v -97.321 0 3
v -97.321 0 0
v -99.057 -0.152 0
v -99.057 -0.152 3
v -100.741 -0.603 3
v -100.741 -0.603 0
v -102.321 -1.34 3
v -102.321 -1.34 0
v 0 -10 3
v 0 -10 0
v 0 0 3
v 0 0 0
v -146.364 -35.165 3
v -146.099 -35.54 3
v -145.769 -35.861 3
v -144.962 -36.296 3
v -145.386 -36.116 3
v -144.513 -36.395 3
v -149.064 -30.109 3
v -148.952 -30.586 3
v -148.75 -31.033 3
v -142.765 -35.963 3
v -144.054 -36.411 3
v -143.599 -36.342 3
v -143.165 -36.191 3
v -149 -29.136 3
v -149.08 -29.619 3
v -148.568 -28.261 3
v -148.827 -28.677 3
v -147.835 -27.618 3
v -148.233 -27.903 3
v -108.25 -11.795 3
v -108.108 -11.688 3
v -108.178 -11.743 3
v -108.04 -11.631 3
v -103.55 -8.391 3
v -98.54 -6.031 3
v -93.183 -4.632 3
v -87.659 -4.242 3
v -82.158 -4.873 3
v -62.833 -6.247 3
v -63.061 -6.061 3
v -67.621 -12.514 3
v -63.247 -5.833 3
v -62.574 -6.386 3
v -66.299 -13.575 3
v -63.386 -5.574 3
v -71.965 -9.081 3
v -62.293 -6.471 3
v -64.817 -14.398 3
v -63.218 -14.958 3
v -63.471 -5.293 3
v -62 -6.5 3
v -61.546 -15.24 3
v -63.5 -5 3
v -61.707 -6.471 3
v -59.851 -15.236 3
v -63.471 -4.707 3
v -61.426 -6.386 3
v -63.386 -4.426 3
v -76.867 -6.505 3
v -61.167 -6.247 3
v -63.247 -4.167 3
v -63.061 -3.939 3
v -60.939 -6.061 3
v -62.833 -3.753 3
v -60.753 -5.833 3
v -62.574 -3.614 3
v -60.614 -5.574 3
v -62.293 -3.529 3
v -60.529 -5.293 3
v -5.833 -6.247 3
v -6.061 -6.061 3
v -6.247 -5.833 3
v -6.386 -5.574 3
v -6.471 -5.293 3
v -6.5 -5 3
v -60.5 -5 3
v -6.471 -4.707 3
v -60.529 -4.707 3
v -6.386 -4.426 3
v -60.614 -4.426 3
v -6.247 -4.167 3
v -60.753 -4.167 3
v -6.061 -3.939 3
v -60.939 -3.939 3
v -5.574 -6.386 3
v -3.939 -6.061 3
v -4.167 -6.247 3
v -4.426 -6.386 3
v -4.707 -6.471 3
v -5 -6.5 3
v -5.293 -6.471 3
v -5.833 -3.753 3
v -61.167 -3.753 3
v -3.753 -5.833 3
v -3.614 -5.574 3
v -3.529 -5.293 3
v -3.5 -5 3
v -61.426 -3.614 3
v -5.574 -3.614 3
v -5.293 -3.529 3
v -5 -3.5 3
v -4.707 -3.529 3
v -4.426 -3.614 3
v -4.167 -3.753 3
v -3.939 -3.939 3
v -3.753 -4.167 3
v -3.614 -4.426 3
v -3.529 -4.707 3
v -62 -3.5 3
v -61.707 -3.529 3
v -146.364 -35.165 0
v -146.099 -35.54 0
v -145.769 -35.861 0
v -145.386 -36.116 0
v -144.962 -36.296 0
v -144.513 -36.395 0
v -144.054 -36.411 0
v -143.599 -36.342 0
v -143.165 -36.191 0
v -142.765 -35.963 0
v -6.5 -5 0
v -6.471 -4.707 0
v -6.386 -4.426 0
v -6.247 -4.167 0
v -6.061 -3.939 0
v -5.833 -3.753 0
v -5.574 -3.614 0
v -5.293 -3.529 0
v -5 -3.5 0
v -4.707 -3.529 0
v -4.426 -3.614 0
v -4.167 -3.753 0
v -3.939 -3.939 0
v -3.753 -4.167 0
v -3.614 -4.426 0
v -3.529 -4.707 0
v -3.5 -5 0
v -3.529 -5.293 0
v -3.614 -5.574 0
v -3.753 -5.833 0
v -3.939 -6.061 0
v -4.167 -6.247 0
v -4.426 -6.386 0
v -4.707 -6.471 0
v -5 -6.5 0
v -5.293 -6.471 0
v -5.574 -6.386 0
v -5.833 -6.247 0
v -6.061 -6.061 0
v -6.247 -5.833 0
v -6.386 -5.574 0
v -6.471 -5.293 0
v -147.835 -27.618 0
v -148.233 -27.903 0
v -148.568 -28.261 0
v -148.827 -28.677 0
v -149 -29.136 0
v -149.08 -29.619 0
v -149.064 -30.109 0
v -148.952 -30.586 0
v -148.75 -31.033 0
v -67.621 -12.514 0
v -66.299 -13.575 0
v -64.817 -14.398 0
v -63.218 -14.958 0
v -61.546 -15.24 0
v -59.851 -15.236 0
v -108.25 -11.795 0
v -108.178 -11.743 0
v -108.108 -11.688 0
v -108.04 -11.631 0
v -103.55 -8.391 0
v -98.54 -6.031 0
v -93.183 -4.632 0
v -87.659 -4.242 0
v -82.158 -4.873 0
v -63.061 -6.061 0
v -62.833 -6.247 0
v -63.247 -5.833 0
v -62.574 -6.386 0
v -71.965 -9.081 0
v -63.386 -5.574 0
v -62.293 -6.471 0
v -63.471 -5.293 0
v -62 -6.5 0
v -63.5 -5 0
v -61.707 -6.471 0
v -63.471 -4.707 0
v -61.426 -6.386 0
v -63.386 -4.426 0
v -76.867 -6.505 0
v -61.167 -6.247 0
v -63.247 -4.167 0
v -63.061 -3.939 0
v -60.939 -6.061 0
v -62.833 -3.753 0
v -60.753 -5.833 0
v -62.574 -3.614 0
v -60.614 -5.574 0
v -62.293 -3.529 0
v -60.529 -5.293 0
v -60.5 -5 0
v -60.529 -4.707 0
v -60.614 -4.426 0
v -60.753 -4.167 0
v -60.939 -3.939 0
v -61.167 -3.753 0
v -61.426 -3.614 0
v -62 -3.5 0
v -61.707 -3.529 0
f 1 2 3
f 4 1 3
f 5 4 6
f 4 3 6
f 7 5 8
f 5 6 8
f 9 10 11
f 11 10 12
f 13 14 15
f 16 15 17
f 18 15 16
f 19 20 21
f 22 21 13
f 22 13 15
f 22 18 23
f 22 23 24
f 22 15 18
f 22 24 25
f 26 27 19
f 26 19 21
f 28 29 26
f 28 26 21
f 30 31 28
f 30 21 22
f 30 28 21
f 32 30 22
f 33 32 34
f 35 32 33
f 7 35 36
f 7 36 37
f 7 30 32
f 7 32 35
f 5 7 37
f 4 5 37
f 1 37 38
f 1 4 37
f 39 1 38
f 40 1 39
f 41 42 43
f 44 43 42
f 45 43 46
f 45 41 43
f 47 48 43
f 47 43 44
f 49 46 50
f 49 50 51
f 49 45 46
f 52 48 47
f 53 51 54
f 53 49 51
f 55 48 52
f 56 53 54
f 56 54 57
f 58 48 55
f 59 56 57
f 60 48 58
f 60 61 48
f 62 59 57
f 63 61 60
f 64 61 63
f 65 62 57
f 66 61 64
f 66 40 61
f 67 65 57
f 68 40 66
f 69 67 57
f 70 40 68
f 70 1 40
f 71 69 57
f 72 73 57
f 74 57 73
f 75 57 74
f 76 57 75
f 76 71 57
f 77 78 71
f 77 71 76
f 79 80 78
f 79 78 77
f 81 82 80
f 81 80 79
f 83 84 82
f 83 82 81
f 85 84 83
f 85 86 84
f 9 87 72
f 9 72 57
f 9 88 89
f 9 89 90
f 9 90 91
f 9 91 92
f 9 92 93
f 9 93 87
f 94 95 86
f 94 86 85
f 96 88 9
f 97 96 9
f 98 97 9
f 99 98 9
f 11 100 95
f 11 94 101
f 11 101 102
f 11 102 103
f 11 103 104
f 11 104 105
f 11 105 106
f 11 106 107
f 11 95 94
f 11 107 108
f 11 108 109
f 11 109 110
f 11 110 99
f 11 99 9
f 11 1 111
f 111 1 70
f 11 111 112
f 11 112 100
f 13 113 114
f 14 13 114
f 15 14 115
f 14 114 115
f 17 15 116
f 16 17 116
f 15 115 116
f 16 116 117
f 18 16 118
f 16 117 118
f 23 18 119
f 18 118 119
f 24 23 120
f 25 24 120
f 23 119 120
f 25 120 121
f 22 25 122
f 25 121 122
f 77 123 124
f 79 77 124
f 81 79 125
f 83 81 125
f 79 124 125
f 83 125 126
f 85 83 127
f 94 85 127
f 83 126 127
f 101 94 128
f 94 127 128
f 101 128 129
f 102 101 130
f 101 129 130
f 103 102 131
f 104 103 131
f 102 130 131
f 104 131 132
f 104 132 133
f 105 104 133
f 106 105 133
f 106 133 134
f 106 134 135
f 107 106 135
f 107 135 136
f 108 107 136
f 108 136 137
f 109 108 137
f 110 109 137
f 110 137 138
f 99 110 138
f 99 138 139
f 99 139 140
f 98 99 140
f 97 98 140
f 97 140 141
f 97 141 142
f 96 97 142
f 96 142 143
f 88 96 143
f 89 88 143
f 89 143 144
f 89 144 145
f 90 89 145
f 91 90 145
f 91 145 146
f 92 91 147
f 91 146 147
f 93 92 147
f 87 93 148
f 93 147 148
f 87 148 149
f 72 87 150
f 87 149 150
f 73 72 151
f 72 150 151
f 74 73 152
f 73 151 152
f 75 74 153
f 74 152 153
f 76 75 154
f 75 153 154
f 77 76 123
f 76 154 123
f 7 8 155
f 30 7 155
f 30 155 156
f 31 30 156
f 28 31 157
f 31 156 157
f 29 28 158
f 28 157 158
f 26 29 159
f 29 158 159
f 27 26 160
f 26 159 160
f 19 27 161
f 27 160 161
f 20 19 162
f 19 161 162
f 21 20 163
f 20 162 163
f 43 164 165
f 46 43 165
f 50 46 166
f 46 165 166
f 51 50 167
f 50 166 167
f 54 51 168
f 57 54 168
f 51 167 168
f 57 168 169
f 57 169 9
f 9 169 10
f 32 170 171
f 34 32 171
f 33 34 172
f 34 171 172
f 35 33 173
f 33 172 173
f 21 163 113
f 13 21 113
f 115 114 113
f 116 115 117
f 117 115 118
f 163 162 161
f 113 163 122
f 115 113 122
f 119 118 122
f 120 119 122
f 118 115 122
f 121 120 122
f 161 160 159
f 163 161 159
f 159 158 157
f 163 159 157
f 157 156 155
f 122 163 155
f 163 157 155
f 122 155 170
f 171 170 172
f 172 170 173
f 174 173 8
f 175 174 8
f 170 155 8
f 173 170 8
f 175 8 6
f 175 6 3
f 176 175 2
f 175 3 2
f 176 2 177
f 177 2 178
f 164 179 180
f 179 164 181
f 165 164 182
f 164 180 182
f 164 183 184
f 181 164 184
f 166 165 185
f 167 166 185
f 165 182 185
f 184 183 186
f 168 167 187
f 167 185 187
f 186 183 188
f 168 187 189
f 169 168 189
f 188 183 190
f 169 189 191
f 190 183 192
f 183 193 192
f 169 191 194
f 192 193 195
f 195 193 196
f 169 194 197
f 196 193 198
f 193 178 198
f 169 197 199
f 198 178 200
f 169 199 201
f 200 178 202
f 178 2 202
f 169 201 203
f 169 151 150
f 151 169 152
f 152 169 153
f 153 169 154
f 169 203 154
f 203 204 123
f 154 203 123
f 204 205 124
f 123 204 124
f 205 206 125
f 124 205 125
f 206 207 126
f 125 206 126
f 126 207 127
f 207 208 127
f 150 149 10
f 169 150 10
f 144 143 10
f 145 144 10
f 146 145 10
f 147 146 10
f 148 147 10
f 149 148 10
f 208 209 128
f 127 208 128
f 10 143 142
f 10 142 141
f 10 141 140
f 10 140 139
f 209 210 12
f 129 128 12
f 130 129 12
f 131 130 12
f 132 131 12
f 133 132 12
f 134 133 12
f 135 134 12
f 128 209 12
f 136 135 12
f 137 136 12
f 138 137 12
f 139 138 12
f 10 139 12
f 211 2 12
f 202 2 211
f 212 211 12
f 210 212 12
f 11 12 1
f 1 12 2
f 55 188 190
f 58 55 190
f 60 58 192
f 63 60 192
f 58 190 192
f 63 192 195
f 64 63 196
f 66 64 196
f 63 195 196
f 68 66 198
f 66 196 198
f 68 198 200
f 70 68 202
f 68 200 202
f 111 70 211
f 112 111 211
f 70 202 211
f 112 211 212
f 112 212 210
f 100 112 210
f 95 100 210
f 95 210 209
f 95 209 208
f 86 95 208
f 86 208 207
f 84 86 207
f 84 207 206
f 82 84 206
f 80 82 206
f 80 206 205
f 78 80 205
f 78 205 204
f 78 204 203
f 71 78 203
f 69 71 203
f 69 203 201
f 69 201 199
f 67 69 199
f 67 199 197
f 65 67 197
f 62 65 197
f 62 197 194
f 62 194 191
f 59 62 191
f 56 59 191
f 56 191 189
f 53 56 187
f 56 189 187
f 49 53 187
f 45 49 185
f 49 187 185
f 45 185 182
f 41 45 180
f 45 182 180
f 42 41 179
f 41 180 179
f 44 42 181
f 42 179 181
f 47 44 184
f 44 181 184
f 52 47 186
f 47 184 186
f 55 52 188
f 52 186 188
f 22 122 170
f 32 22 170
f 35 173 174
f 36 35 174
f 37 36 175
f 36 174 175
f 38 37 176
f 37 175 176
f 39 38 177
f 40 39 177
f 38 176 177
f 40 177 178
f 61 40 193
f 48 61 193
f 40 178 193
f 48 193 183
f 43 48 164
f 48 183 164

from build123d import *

# Parameters (mm, degrees)
BOSS_EXTRUDE1_DEPTH = 3
SKETCH2_R           = 1.5
CUT_EXTRUDE1_DEPTH  = 10


with BuildPart() as part:
    # Sketch1 → Boss-Extrude1 (new body)
    with BuildSketch(Plane.XY):
        with BuildLine():
            Line((0, 0), (-97.320508076, 0))
            ThreePointArc((-97.320508076, 0), (-99.908698527, -0.340741737), (-102.320508076, -1.339745962))
            Line((-102.320508076, -1.339745962), (-147.834936491, -27.617513459))
            ThreePointArc((-147.834936491, -27.617513459), (-148.999751056, -29.135529356), (-148.75, -31.032576969))
            Line((-148.75, -31.032576969), (-146.364135626, -35.165015284))
            ThreePointArc((-146.364135626, -35.165015284), (-144.740171152, -36.355755302), (-142.765131026, -35.962895395))
            Line((-142.765131026, -35.962895395), (-108.249632243, -11.794882962))
            ThreePointArc((-108.249632243, -11.794882962), (-108.142543563, -11.71556254), (-108.039833804, -11.630648348))
            ThreePointArc((-108.039833804, -11.630648348), (-87.659186574, -4.241562471), (-67.620976195, -12.514379188))
            ThreePointArc((-67.620976195, -12.514379188), (-64.029298108, -14.71197301), (-59.851424349, -15.236321126))
            Line((-59.851424349, -15.236321126), (0, -10))
            Line((0, -10), (0, 0))
        make_face()
    extrude(amount=BOSS_EXTRUDE1_DEPTH)

    # Sketch2 → Cut-Extrude1 (cut)
    with BuildSketch(Plane(origin=(0, 0, 0), x_dir=(-1, 0, 0), z_dir=(0, 0, -1))):
        with Locations((5, -5)):
            Circle(SKETCH2_R)
        with Locations((62, -5)):
            Circle(SKETCH2_R)
    extrude(amount=-CUT_EXTRUDE1_DEPTH, mode=Mode.SUBTRACT)


solid = part.part
